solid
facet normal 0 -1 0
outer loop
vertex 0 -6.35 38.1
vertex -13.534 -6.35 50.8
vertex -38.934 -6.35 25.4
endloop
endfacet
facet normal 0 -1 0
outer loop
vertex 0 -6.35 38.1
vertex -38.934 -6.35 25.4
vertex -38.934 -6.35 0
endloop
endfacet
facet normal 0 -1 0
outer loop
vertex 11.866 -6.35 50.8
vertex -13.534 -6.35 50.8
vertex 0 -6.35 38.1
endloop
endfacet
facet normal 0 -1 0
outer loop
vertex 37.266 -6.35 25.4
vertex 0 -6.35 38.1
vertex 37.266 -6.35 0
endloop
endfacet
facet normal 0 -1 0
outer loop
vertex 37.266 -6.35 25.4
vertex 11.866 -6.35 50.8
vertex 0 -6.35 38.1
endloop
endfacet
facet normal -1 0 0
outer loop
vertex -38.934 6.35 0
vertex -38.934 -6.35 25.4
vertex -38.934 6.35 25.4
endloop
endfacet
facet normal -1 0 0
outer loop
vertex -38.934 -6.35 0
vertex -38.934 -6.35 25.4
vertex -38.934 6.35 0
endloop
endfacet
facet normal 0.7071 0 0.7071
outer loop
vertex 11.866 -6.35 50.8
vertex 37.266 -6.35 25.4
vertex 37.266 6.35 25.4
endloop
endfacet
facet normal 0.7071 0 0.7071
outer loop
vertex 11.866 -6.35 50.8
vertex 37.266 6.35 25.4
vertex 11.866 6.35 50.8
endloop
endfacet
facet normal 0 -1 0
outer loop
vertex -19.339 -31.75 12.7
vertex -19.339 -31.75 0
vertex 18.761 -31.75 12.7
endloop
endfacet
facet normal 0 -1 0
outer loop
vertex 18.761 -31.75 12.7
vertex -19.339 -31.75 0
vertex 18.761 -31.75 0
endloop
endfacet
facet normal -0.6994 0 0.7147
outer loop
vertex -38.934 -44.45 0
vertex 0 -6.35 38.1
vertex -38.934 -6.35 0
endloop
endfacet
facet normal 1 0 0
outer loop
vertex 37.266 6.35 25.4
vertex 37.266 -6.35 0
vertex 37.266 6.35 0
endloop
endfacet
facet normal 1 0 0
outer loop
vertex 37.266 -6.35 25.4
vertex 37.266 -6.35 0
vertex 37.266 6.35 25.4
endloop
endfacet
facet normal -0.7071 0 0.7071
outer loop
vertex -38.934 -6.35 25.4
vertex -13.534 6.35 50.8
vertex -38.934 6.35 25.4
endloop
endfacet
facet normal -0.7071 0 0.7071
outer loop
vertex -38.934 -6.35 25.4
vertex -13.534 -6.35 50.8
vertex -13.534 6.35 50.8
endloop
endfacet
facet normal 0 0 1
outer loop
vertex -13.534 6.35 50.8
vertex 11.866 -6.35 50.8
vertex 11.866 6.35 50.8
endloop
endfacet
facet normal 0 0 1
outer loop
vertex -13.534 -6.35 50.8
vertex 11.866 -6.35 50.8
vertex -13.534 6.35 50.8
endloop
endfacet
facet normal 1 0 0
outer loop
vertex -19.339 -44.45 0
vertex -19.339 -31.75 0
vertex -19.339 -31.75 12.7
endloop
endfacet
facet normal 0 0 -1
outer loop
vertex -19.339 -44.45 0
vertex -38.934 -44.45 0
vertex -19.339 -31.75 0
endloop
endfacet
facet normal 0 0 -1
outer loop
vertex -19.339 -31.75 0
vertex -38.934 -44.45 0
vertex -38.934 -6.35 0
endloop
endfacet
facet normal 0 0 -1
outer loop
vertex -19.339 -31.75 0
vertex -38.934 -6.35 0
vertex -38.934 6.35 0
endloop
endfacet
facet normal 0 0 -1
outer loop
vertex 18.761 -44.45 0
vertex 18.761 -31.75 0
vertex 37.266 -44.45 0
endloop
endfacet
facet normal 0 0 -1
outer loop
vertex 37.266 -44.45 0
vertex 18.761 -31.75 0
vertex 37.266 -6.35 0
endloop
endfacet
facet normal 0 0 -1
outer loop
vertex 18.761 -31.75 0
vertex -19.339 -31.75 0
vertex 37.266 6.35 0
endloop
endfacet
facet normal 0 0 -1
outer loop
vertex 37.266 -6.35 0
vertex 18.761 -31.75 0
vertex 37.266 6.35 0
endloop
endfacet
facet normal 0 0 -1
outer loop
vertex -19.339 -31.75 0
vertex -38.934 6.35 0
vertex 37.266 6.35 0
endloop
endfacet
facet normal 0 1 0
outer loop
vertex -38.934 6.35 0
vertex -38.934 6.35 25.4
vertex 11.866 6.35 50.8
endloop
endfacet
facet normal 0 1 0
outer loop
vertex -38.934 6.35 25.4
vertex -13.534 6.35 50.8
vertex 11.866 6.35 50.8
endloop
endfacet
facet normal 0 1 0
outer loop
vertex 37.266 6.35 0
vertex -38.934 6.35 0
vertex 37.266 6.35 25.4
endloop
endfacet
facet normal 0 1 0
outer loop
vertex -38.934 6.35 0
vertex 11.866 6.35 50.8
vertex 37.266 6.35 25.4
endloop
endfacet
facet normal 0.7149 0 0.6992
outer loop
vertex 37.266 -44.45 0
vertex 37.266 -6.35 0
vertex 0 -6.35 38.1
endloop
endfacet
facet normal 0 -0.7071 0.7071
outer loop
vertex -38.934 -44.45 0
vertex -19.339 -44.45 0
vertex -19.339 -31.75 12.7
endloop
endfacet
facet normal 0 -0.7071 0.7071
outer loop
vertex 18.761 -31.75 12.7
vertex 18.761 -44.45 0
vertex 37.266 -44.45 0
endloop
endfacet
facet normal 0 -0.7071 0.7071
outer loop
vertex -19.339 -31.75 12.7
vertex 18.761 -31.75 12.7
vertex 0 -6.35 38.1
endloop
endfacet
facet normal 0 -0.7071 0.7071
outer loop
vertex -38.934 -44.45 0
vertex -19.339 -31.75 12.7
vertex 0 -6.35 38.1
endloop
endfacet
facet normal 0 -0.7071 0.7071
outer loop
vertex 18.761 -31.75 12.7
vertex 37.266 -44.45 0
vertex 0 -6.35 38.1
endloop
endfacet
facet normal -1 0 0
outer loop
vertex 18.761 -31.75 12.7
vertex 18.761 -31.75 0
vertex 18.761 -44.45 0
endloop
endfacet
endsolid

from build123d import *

# Parameters (mm, degrees)
F1_DEPTH = 6.35
F3_DEPTH = 38.1
F5_DEPTH = 76.2
F6_W     = 38.1
F6_H     = 12.7
F7_DEPTH = 25.4


with BuildPart() as f1:
    # F0 (on Front) → F1 (new body, symmetric)
    with BuildSketch(Plane.XZ):
        Polygon((-38.934134, 25.4), (-38.934134, 0), (37.265866, 0), (37.265866, 25.4), (11.865866, 50.8), (-13.534134, 50.8), align=None)
    extrude(amount=F1_DEPTH, both=True)

    # F2 (on face) → F3 (join)
    with BuildSketch(Plane.XZ.offset(6.35)):
        Polygon((0, 38.1), (-38.934134, 0), (37.265866, 0), align=None)
    extrude(amount=F3_DEPTH)

    # F4 (on face) → F5 (cut)
    with BuildSketch(Plane.YZ.offset(37.265866)):
        Polygon((-44.45, 38.1), (-44.45, 0), (-6.35, 38.1), align=None)
    extrude(amount=-F5_DEPTH, mode=Mode.SUBTRACT)

    # F6 (on face) → F7 (cut)
    with BuildSketch(Plane(origin=(0, 0, 0), x_dir=(1, 0, 0), z_dir=(0, 0, -1))):
        with Locations((-0.28891, 38.1)):
            Rectangle(F6_W, F6_H)
    extrude(amount=-F7_DEPTH, mode=Mode.SUBTRACT)


solid = f1.part
